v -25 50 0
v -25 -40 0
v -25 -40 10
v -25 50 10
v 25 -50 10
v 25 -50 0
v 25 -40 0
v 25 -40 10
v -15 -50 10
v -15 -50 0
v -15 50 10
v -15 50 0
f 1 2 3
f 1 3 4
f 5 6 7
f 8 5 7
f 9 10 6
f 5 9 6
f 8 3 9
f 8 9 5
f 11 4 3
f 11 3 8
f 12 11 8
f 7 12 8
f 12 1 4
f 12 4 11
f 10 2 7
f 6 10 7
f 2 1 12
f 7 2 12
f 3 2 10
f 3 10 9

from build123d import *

# Parameters (mm, degrees)
F0_W     = 50
F0_H     = 100
F1_DEPTH = 10
F2_SIZE  = 10
F4_DEPTH = 10.001


with BuildPart() as f1:
    # F0 (on Top) → F1 (new body)
    with BuildSketch(Plane.XY):
        Rectangle(F0_W, F0_H)
    extrude(amount=F1_DEPTH)

    # F2
    f2_edges = [f1.edges().sort_by_distance(p)[0] for p in [
        (-25, -50, 5),
    ]]
    chamfer(f2_edges, length=F2_SIZE)

    # F3 (on face) → F4 (cut, through all)
    with BuildSketch(Plane.XY.offset(10)):
        Polygon((25, 50), (-15, 50), (25, -40), align=None)
    extrude(amount=-F4_DEPTH, mode=Mode.SUBTRACT)


solid = f1.part
